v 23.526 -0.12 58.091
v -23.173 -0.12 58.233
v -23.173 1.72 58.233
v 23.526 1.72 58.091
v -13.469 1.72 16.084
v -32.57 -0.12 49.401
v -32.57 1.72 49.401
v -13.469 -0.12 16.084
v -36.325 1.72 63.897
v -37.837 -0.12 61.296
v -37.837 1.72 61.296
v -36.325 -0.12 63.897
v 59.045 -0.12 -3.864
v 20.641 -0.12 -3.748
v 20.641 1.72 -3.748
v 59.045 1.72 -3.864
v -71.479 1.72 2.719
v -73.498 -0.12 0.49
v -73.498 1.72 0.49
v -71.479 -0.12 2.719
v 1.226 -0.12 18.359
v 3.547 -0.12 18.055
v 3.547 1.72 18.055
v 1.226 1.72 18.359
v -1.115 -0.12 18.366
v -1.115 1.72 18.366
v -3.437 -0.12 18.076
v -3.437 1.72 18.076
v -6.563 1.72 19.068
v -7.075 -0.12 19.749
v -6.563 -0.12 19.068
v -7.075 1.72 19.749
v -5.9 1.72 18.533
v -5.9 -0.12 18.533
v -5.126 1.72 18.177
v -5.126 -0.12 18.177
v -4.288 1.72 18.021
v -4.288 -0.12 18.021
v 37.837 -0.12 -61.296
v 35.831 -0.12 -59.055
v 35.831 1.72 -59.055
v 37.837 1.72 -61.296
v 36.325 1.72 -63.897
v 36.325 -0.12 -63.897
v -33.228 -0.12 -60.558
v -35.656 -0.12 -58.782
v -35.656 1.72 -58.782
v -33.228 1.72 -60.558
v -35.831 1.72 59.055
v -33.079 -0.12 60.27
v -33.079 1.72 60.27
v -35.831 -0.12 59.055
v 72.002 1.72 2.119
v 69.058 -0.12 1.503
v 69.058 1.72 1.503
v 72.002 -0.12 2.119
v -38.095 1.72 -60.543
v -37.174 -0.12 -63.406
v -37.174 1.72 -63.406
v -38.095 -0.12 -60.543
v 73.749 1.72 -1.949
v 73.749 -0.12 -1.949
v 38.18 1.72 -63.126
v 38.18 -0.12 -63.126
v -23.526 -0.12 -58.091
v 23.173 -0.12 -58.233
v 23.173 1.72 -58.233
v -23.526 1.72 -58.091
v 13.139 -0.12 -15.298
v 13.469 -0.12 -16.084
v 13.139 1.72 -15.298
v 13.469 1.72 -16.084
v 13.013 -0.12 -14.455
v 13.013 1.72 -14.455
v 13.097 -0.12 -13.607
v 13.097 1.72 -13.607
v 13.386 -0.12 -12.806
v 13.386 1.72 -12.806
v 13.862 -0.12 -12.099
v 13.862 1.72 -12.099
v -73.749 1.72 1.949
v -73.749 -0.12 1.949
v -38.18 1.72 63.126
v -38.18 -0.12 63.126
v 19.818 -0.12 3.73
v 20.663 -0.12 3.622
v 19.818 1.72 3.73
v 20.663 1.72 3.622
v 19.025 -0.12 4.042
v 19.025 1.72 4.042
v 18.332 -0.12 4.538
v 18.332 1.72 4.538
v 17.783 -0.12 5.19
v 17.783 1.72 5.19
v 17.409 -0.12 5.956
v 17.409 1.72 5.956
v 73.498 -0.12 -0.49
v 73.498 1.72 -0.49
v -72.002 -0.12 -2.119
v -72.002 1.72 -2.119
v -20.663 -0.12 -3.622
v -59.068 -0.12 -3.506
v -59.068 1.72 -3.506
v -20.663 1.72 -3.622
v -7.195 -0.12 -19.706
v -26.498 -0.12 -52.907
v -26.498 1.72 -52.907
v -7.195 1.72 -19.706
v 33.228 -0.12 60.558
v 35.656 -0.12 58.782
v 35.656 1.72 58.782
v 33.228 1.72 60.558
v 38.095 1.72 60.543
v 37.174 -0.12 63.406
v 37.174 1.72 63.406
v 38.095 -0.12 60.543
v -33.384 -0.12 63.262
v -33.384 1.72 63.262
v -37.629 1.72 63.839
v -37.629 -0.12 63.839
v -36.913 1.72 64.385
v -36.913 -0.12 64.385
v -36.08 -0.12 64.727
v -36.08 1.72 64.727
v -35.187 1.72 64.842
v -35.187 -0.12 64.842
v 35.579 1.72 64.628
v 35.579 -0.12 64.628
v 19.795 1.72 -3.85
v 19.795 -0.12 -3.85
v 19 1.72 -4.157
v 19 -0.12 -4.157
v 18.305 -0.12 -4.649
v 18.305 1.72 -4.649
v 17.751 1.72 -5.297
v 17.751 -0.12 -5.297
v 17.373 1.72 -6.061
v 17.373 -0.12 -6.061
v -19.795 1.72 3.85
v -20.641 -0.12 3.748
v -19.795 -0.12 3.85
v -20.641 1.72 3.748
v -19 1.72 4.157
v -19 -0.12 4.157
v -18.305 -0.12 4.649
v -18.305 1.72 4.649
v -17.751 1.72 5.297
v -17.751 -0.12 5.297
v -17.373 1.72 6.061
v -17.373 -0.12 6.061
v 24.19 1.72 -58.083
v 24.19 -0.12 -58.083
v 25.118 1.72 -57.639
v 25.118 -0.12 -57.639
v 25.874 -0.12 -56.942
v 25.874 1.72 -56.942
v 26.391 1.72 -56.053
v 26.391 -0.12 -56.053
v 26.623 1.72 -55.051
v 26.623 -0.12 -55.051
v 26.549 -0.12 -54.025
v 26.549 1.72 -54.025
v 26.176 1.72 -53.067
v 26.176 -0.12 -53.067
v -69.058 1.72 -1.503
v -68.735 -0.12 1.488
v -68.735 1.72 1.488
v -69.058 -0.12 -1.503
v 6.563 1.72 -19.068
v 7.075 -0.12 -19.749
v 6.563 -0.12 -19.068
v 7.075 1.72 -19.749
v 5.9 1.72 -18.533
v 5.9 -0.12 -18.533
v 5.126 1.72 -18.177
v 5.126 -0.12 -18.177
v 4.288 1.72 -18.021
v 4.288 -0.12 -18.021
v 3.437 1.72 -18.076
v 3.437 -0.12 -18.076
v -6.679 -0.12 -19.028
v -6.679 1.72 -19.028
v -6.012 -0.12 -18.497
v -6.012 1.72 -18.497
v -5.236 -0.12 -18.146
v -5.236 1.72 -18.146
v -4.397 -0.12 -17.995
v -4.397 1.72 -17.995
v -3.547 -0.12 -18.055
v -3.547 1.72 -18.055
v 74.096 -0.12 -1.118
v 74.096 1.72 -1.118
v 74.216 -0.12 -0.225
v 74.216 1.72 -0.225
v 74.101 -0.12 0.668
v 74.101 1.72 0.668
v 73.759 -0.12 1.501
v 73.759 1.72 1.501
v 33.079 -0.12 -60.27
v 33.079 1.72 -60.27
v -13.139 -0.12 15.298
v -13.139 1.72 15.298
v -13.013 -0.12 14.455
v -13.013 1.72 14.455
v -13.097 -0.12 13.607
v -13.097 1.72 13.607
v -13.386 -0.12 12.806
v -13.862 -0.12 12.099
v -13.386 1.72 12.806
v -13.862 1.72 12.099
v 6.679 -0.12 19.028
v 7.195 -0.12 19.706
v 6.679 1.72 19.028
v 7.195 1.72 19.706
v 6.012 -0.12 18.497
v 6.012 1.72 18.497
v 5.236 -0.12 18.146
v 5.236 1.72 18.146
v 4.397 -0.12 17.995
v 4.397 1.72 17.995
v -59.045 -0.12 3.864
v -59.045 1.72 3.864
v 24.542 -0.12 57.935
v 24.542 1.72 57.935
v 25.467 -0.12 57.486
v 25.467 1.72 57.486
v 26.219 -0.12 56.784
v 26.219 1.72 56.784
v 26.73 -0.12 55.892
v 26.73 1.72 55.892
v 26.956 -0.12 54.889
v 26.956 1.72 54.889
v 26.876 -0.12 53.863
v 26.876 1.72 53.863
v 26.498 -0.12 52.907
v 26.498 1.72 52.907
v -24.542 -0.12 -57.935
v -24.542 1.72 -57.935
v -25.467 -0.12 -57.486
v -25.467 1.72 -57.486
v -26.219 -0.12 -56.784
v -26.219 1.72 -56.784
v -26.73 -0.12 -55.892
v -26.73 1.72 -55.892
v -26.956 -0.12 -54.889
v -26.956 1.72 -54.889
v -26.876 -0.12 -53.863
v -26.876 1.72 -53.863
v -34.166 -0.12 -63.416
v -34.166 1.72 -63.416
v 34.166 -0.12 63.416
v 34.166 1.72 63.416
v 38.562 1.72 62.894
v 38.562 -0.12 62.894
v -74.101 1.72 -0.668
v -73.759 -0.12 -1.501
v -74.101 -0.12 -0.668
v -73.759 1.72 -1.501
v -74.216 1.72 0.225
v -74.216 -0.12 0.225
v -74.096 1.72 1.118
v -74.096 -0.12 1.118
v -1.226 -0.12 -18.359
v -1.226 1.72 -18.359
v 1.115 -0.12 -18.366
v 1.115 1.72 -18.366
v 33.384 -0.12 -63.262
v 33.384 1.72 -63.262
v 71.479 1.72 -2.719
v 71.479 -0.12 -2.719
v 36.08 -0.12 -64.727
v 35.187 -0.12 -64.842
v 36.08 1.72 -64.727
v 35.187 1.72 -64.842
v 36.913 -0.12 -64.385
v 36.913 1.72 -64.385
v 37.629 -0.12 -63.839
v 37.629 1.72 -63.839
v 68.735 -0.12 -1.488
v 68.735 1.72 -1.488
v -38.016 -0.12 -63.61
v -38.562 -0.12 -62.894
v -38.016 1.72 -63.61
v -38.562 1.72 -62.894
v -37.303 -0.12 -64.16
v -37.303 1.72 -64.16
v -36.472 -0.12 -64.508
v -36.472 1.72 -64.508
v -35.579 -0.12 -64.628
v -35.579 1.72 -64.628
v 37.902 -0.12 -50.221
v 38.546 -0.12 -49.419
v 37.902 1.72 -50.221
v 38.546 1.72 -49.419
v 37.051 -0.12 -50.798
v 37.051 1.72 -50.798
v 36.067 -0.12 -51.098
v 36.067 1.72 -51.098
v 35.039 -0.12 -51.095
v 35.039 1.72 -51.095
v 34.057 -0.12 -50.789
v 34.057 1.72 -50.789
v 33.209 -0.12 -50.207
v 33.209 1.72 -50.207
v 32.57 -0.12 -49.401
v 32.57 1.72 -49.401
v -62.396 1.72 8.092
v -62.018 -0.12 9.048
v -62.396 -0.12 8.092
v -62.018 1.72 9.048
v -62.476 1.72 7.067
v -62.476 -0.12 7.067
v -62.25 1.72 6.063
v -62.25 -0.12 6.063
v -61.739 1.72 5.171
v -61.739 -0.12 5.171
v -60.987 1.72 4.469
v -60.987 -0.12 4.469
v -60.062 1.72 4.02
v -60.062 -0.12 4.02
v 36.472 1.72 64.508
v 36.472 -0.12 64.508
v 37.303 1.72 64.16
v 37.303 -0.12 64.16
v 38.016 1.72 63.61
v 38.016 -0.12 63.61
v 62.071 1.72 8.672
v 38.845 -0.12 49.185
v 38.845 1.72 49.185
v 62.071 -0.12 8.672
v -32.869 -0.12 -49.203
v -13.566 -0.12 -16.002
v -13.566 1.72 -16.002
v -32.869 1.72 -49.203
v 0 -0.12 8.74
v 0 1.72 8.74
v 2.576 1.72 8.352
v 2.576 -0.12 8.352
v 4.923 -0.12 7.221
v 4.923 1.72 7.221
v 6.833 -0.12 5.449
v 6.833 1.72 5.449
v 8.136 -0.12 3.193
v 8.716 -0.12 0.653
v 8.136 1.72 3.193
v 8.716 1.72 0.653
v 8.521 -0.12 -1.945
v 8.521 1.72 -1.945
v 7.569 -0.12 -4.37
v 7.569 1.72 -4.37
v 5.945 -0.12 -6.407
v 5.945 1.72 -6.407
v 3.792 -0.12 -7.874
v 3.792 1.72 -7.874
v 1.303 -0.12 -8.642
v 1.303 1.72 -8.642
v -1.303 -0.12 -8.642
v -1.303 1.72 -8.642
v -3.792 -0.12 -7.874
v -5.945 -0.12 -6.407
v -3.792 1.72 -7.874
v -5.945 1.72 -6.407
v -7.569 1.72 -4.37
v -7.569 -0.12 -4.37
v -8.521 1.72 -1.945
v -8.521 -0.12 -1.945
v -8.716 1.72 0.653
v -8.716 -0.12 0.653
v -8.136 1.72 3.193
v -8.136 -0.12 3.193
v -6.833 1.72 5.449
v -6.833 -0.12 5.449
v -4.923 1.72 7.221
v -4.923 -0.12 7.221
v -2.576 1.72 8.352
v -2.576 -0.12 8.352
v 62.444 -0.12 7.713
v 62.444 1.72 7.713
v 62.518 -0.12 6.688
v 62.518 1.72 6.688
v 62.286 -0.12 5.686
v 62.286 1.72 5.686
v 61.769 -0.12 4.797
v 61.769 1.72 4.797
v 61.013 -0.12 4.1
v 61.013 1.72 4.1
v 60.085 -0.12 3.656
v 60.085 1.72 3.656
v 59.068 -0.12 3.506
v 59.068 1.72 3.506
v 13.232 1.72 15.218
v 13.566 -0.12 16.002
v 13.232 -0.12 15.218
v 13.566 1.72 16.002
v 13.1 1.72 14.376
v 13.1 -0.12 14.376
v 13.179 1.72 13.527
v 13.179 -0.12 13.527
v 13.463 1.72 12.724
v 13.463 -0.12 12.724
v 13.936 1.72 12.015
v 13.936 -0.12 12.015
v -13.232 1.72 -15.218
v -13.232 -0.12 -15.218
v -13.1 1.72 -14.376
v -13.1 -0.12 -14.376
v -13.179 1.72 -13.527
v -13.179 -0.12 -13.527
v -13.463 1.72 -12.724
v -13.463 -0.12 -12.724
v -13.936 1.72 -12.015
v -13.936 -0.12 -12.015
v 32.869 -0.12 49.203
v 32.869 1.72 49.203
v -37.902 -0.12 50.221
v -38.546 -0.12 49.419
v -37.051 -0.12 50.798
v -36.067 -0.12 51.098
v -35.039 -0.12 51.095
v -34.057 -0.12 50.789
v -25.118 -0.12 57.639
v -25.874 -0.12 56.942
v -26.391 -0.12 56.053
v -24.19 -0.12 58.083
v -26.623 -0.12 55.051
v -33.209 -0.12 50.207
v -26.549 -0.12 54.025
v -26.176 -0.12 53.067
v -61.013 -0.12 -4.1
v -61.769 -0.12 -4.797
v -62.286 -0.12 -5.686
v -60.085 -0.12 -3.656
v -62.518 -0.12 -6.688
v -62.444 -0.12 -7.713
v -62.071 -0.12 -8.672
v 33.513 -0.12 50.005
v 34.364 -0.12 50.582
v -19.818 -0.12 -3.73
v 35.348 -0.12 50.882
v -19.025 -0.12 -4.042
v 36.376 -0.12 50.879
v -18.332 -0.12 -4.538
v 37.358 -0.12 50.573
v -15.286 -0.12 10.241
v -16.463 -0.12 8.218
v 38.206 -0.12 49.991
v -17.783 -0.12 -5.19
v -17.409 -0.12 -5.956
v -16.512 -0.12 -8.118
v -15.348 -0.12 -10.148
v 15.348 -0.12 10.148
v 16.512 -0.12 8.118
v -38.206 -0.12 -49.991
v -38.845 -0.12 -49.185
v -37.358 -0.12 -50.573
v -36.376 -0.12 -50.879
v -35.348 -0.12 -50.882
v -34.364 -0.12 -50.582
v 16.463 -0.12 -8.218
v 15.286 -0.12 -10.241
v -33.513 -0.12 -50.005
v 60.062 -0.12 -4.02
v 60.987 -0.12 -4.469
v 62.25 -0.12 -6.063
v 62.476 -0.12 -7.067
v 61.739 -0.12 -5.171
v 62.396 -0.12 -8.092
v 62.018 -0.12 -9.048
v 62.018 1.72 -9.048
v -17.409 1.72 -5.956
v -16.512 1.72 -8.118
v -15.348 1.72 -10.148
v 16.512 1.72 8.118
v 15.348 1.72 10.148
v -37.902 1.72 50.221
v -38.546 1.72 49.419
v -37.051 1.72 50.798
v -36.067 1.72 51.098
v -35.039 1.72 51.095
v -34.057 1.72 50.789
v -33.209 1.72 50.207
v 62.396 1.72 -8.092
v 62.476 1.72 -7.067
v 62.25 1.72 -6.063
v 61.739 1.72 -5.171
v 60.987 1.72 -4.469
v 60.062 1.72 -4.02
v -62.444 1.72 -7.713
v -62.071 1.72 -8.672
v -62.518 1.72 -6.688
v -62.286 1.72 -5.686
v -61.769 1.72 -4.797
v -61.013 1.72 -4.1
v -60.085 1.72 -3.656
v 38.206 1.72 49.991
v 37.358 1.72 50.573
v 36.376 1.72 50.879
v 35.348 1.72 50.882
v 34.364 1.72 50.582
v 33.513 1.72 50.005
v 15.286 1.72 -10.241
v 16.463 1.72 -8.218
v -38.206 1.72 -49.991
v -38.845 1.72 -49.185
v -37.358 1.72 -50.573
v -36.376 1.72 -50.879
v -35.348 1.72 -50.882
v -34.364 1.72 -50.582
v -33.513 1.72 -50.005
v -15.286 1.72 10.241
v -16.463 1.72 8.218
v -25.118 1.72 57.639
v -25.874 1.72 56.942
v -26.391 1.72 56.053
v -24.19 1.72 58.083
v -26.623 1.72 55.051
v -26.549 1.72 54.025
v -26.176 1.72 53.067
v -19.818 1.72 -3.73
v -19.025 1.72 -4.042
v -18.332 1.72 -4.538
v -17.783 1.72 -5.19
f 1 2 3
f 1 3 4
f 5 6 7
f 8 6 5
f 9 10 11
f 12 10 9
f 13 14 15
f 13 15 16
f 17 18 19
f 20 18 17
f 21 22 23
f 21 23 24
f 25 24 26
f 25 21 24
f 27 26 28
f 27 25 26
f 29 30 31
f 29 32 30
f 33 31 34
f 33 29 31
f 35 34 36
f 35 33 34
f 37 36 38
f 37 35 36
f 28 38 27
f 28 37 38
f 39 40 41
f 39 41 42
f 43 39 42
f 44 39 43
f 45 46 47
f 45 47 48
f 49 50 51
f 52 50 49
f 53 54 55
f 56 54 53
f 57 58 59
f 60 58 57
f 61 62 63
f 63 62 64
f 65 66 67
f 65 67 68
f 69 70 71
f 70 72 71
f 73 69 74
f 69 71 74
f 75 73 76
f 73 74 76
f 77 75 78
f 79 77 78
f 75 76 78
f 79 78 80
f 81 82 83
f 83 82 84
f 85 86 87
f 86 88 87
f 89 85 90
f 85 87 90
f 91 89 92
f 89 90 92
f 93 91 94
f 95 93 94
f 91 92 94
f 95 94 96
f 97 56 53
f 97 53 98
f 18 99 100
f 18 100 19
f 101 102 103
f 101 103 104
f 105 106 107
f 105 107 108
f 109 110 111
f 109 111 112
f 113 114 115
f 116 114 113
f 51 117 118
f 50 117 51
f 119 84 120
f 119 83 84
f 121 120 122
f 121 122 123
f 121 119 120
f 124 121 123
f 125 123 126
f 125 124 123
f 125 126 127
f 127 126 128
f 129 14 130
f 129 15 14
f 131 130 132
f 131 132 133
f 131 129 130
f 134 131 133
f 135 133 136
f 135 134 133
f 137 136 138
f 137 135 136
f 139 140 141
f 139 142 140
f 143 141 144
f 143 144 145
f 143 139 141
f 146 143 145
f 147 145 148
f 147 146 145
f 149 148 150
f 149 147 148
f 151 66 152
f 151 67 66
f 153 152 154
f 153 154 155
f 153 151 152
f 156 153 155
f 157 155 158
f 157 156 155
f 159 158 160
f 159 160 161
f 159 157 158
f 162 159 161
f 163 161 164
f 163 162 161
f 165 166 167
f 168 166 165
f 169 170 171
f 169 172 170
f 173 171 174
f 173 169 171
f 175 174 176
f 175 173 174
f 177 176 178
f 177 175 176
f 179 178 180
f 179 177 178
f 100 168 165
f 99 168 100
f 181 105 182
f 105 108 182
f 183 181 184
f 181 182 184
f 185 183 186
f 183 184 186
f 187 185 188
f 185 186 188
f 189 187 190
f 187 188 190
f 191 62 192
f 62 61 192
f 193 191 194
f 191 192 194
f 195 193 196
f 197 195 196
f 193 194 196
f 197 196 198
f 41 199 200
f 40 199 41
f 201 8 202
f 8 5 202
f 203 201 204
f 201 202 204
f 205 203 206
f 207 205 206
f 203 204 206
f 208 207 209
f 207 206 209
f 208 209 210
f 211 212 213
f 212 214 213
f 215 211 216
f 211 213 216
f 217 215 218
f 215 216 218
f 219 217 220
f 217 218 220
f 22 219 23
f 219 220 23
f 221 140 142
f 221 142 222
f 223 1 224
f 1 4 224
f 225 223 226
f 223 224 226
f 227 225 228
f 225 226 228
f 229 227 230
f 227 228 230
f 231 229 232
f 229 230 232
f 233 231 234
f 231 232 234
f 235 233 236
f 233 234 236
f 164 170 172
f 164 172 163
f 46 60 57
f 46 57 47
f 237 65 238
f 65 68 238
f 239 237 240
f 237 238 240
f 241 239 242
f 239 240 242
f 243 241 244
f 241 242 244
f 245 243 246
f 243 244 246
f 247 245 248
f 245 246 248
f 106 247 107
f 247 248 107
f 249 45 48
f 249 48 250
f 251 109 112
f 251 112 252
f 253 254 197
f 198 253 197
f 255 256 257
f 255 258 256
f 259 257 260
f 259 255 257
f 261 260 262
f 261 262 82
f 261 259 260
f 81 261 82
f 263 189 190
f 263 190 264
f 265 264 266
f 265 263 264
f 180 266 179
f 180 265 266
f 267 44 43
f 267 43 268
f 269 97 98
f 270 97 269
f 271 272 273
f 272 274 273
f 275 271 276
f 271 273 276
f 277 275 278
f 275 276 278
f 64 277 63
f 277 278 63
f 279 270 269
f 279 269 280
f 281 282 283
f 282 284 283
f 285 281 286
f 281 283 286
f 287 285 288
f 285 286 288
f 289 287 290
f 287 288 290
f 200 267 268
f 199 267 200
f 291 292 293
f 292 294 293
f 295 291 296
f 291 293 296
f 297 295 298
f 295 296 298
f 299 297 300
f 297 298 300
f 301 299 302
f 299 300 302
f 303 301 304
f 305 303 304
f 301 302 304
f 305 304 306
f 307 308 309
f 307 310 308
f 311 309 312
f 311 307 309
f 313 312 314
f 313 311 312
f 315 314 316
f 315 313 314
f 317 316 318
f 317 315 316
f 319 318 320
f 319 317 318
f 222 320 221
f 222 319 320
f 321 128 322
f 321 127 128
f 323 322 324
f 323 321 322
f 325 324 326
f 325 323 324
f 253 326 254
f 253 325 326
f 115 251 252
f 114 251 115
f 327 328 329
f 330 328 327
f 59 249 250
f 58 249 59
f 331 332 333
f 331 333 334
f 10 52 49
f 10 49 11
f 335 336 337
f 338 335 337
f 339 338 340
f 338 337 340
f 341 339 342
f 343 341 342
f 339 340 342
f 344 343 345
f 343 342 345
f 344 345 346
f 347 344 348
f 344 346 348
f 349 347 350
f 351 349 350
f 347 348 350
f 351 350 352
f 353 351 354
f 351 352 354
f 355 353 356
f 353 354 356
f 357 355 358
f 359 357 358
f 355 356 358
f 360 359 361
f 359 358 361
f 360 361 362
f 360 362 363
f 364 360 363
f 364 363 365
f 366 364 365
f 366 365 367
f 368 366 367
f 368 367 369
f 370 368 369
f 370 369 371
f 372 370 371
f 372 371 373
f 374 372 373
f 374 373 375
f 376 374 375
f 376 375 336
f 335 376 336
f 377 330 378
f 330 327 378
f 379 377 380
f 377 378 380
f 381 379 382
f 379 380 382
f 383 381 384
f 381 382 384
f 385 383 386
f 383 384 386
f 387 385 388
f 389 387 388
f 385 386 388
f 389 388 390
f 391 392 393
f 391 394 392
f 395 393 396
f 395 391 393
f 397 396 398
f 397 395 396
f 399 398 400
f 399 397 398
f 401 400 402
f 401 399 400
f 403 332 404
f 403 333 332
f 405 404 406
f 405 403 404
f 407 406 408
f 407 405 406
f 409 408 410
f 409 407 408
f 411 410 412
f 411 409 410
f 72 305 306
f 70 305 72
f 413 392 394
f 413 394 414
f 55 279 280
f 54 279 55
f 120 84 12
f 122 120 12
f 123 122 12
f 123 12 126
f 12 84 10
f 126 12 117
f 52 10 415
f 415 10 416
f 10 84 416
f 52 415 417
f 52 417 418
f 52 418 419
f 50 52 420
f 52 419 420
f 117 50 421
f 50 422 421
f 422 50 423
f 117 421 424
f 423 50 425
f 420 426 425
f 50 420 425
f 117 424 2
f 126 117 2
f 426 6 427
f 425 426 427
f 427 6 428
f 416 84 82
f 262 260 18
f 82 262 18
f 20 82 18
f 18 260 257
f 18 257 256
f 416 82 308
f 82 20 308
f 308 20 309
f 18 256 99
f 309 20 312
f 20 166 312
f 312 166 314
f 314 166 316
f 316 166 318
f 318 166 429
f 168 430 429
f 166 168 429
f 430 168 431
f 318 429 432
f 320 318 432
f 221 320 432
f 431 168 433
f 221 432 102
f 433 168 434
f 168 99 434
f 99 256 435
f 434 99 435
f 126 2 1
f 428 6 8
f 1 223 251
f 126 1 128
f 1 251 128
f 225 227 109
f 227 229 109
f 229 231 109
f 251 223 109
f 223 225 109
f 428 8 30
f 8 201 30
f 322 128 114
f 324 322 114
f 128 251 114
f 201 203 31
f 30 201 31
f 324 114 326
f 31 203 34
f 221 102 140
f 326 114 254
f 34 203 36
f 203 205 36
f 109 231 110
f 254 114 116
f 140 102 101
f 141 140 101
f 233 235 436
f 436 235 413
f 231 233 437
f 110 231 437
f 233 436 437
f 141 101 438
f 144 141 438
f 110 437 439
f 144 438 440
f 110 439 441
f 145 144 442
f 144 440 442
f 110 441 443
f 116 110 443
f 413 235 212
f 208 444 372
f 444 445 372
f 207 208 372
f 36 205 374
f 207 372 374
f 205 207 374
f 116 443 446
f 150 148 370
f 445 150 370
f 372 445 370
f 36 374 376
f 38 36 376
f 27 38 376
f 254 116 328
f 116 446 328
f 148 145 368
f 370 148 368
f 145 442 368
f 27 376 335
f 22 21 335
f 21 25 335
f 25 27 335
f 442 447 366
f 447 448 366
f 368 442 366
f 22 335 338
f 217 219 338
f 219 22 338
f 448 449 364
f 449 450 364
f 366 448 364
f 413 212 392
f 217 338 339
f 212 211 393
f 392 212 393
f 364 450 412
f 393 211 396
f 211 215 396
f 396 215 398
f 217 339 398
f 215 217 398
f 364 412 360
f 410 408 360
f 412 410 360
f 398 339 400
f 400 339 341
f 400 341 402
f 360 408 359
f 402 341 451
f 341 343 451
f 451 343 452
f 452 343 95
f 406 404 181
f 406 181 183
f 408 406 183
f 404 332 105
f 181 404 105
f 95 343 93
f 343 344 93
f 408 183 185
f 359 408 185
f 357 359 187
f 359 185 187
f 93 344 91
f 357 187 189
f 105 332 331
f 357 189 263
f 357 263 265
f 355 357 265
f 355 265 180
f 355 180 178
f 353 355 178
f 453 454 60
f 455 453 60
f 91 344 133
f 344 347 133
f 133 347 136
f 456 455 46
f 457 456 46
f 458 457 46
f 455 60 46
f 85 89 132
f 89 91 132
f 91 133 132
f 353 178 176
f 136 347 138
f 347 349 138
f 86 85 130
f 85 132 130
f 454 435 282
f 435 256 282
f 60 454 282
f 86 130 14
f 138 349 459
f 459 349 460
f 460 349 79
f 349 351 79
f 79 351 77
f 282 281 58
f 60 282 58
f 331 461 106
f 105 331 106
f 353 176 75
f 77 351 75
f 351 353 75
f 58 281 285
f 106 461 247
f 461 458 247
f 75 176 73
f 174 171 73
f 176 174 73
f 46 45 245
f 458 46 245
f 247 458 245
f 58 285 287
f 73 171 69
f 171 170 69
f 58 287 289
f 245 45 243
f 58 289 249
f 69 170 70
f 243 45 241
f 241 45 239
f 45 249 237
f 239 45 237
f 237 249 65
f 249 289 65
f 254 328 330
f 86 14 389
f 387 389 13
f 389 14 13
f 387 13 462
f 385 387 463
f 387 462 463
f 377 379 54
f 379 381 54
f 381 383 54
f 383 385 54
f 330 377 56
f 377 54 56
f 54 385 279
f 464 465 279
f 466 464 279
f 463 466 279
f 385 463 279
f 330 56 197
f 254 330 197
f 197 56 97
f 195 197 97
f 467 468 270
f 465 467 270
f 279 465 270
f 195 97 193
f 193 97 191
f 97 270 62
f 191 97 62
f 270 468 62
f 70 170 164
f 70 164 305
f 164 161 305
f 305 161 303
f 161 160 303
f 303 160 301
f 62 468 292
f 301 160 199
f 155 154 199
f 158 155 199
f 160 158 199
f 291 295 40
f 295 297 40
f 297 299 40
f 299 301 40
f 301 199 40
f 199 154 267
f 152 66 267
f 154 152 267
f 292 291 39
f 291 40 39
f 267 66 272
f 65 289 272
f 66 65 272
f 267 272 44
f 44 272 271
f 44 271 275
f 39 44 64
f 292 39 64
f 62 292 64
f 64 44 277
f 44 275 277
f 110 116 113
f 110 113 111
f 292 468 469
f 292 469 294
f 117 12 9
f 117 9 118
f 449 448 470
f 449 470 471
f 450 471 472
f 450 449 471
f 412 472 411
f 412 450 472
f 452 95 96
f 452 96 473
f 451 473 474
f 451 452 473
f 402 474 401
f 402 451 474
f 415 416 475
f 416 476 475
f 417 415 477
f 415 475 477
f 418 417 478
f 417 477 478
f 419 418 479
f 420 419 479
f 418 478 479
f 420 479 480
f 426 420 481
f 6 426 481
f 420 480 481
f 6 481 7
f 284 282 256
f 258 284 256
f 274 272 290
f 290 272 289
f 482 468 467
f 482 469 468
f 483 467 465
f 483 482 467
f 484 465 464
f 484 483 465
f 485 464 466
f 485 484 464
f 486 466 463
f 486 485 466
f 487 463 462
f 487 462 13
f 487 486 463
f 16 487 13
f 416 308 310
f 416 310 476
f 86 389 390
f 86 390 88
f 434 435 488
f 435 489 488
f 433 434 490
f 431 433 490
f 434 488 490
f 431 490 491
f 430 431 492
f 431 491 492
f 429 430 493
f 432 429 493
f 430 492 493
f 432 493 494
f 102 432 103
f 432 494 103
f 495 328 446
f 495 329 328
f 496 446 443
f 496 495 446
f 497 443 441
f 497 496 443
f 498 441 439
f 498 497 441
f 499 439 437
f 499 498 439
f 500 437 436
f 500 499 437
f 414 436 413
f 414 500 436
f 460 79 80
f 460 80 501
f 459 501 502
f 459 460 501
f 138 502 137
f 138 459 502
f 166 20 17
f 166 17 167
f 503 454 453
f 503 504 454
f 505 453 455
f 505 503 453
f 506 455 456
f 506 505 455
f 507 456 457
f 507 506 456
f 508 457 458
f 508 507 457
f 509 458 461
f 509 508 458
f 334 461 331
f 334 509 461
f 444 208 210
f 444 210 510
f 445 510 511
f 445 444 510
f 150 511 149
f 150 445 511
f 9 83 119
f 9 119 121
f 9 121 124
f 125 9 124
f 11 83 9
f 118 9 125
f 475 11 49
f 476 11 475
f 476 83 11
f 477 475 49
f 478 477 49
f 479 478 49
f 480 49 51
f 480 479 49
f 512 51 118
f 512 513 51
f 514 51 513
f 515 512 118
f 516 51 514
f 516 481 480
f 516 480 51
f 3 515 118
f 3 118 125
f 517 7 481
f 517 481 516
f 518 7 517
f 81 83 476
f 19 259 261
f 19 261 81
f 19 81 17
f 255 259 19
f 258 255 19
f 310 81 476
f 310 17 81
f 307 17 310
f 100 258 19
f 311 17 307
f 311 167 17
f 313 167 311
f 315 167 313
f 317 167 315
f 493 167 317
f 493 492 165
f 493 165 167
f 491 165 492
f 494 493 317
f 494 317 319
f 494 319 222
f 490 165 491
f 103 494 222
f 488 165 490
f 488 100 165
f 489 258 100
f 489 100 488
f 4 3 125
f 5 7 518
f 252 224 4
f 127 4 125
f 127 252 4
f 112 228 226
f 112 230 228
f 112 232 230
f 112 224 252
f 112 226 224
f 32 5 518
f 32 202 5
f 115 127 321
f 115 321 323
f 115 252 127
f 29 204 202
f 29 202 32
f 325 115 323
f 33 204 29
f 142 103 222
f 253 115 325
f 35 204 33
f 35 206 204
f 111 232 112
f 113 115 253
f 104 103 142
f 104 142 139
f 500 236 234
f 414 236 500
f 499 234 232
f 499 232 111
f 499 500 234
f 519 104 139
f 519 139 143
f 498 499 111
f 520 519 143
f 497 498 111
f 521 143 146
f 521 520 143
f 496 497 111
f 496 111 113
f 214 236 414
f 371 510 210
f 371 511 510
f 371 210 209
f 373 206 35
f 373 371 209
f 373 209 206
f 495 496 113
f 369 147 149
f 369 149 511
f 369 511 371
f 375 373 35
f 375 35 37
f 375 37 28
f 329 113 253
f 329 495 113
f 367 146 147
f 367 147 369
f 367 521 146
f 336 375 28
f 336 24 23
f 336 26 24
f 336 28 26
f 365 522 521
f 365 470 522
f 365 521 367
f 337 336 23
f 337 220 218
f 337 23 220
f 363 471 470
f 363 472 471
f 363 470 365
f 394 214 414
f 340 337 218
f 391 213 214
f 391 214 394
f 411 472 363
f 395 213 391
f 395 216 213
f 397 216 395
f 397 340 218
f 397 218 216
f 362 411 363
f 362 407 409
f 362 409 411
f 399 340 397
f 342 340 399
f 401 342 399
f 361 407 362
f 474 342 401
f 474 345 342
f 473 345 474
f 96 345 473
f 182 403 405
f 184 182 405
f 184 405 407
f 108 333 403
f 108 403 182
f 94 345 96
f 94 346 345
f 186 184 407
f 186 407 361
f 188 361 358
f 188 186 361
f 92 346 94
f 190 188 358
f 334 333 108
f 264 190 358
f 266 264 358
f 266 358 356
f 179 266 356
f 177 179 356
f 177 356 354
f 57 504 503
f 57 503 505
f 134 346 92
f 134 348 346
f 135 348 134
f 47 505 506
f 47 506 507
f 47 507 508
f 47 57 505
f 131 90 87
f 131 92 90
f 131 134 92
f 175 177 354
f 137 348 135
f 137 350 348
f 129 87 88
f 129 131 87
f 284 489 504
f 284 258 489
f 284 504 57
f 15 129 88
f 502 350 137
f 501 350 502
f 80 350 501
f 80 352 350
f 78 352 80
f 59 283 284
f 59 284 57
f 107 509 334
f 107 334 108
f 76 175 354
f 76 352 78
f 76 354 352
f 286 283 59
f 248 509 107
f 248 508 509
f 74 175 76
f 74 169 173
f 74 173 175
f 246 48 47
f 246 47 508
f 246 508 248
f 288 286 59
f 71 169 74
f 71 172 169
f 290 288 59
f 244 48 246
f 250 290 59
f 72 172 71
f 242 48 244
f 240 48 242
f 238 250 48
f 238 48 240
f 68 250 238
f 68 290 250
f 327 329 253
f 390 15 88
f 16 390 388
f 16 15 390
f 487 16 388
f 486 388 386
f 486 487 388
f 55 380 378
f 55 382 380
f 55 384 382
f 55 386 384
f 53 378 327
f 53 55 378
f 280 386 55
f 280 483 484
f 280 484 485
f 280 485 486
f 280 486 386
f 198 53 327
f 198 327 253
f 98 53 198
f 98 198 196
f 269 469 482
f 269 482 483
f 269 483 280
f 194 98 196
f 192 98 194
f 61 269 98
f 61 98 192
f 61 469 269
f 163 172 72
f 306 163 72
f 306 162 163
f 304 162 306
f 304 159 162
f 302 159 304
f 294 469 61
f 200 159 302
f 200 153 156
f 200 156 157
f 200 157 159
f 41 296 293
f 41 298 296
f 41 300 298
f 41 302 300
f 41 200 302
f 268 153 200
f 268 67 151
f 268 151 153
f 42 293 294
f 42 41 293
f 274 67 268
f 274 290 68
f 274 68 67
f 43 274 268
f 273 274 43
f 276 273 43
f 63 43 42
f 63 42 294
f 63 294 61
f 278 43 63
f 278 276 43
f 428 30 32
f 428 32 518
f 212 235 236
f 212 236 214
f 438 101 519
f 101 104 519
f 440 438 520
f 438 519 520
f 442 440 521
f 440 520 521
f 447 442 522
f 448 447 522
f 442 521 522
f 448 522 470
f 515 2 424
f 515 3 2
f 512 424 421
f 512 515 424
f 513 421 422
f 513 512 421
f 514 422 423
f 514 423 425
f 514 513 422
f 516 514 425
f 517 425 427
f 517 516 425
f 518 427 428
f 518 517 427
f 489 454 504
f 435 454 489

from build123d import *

# Parameters (mm, degrees)
BOSS_EXTRUDE1_DEPTH = 1.6
FILLET1_R           = 3
FILLET2_R           = 3
SKETCH3_R           = 7.6
CUT_EXTRUDE1_DEPTH  = 10
SCALE1_SCALE        = 1.15


with BuildPart() as part:
    # Sketch1 → Boss-Extrude1 (new body)
    with BuildSketch(Plane(origin=(0, 0, 0), x_dir=(1, 0, 0), z_dir=(0, 1, 0))):
        Polygon((-32.670459977, 56.192891409), (-64.999701461, -0.197002589), (-32.329241484, -56.389893998), (32.670459977, -56.192891409), (64.999701461, 0.197002589), (32.329241484, 56.389893998), align=None)
        with BuildLine():
            Line((-31.193440085, 47.277250649), (-56.559443422, 3.032901767))
            Line((-56.559443422, 3.032901767), (-15.685493875, 3.156783473))
            ThreePointArc((-15.685493875, 3.156783473), (-13.880589292, 7.957967134), (-10.649180608, 11.941312842))
            Line((-10.649180608, 11.941312842), (-31.193440085, 47.277250649))
        make_face(mode=Mode.SUBTRACT)
        with BuildLine():
            Line((-56.540020126, -3.375686221), (-30.906291689, -47.465463944))
            Line((-30.906291689, -47.465463944), (-10.576601619, -12.00564443))
            ThreePointArc((-10.576601619, -12.00564443), (-13.832096347, -8.041959379), (-15.666070579, -3.251804515))
            Line((-15.666070579, -3.251804515), (-56.540020126, -3.375686221))
        make_face(mode=Mode.SUBTRACT)
        with BuildLine():
            Line((-25.346580041, -50.65293687), (25.653151733, -50.498365711))
            Line((25.653151733, -50.498365711), (5.108892256, -15.162427903))
            ThreePointArc((5.108892256, -15.162427903), (0.048492945, -15.999926513), (-5.016889971, -15.193117357))
            Line((-5.016889971, -15.193117357), (-25.346580041, -50.65293687))
        make_face(mode=Mode.SUBTRACT)
        with BuildLine():
            Line((31.193440085, -47.277250649), (56.559443422, -3.032901767))
            Line((56.559443422, -3.032901767), (15.685493875, -3.156783473))
            ThreePointArc((15.685493875, -3.156783473), (13.880589292, -7.957967134), (10.649180608, -11.941312842))
            Line((10.649180608, -11.941312842), (31.193440085, -47.277250649))
        make_face(mode=Mode.SUBTRACT)
        with BuildLine():
            Line((56.540020126, 3.375686221), (30.906291689, 47.465463944))
            Line((30.906291689, 47.465463944), (10.576601619, 12.00564443))
            ThreePointArc((10.576601619, 12.00564443), (13.832096347, 8.041959379), (15.666070579, 3.251804515))
            Line((15.666070579, 3.251804515), (56.540020126, 3.375686221))
        make_face(mode=Mode.SUBTRACT)
        with BuildLine():
            Line((25.346580041, 50.65293687), (-25.653151733, 50.498365711))
            Line((-25.653151733, 50.498365711), (-5.108892256, 15.162427903))
            ThreePointArc((-5.108892256, 15.162427903), (-0.048492945, 15.999926513), (5.016889971, 15.193117357))
            Line((5.016889971, 15.193117357), (25.346580041, 50.65293687))
        make_face(mode=Mode.SUBTRACT)
        Polygon((28.764451985, 52.408726504), (31.157091964, 51.352131998), (32.90133947, 53.301162184), (31.586703733, 55.562323589), (29.029966659, 55.010768007), align=None, mode=Mode.SUBTRACT)
        Polygon((-31.00506254, 51.115109397), (-28.893704867, 52.658899148), (-29.709490768, 55.143976891), (-32.325031855, 55.136049649), (-33.125739246, 52.646072601), align=None, mode=Mode.SUBTRACT)
        Polygon((59.769514525, 1.293617108), (60.050796831, -1.30676715), (62.610830237, -1.842814707), (63.911735588, 0.42627394), (62.155705905, 2.364695405), align=None, mode=Mode.SUBTRACT)
        Polygon((31.00506254, -51.115109397), (28.893704867, -52.658899148), (29.709490768, -55.143976891), (32.325031855, -55.136049649), (33.125739246, -52.646072601), align=None, mode=Mode.SUBTRACT)
        Polygon((-28.764451985, -52.408726504), (-31.157091964, -51.352131998), (-32.90133947, -53.301162184), (-31.586703733, -55.562323589), (-29.029966659, -55.010768007), align=None, mode=Mode.SUBTRACT)
        Polygon((-59.769514525, -1.293617108), (-60.050796831, 1.30676715), (-62.610830237, 1.842814707), (-63.911735588, -0.42627394), (-62.155705905, -2.364695405), align=None, mode=Mode.SUBTRACT)
    extrude(amount=BOSS_EXTRUDE1_DEPTH)

    # Fillet1
    fillet1_edges = [part.edges().sort_by_distance(p)[0] for p in [
        (32.329241484, 0.8, -56.389893998),
        (64.999701461, 0.8, -0.197002589),
        (32.670459977, 0.8, 56.192891409),
        (-32.329241484, 0.8, 56.389893998),
        (-64.999701461, 0.8, 0.197002589),
        (-32.670459977, 0.8, -56.192891409),
    ]]
    fillet(fillet1_edges, radius=FILLET1_R)

    # Fillet2
    fillet2_edges = [part.edges().sort_by_distance(p)[0] for p in [
        (-25.653151733, 0.8, -50.498365711),
        (-5.108892256, 0.8, -15.162427903),
        (5.016889971, 0.8, -15.193117357),
        (25.346580041, 0.8, -50.65293687),
        (30.906291689, 0.8, -47.465463944),
        (10.576601619, 0.8, -12.00564443),
        (15.666070579, 0.8, -3.251804515),
        (56.540020126, 0.8, -3.375686221),
        (56.559443422, 0.8, 3.032901767),
        (15.685493875, 0.8, 3.156783473),
        (10.649180608, 0.8, 11.941312842),
        (31.193440085, 0.8, 47.277250649),
        (25.653151733, 0.8, 50.498365711),
        (5.108892256, 0.8, 15.162427903),
        (-5.016889971, 0.8, 15.193117357),
        (-25.346580041, 0.8, 50.65293687),
        (-30.906291689, 0.8, 47.465463944),
        (-10.576601619, 0.8, 12.00564443),
        (-15.666070579, 0.8, 3.251804515),
        (-56.540020126, 0.8, 3.375686221),
        (-10.649180608, 0.8, -11.941312842),
        (-31.193440085, 0.8, -47.277250649),
        (-56.559443422, 0.8, -3.032901767),
        (-15.685493875, 0.8, -3.156783473),
    ]]
    fillet(fillet2_edges, radius=FILLET2_R)

    # Sketch3 → Cut-Extrude1 (cut)
    with BuildSketch(Plane(origin=(0, 3.6, 0), x_dir=(1, 0, 0), z_dir=(0, 1, 0))):
        with Locations(Location((0, 0, 0), (0, 0, 270))):
            Circle(SKETCH3_R)
    extrude(amount=-CUT_EXTRUDE1_DEPTH, mode=Mode.SUBTRACT)


with BuildPart() as part_1:
    # Scale1: scaled about (0, 0.8, 0)
    add(part.part.scale(SCALE1_SCALE).moved(Location((0, -0.12, 0))))


solid = part_1.part
